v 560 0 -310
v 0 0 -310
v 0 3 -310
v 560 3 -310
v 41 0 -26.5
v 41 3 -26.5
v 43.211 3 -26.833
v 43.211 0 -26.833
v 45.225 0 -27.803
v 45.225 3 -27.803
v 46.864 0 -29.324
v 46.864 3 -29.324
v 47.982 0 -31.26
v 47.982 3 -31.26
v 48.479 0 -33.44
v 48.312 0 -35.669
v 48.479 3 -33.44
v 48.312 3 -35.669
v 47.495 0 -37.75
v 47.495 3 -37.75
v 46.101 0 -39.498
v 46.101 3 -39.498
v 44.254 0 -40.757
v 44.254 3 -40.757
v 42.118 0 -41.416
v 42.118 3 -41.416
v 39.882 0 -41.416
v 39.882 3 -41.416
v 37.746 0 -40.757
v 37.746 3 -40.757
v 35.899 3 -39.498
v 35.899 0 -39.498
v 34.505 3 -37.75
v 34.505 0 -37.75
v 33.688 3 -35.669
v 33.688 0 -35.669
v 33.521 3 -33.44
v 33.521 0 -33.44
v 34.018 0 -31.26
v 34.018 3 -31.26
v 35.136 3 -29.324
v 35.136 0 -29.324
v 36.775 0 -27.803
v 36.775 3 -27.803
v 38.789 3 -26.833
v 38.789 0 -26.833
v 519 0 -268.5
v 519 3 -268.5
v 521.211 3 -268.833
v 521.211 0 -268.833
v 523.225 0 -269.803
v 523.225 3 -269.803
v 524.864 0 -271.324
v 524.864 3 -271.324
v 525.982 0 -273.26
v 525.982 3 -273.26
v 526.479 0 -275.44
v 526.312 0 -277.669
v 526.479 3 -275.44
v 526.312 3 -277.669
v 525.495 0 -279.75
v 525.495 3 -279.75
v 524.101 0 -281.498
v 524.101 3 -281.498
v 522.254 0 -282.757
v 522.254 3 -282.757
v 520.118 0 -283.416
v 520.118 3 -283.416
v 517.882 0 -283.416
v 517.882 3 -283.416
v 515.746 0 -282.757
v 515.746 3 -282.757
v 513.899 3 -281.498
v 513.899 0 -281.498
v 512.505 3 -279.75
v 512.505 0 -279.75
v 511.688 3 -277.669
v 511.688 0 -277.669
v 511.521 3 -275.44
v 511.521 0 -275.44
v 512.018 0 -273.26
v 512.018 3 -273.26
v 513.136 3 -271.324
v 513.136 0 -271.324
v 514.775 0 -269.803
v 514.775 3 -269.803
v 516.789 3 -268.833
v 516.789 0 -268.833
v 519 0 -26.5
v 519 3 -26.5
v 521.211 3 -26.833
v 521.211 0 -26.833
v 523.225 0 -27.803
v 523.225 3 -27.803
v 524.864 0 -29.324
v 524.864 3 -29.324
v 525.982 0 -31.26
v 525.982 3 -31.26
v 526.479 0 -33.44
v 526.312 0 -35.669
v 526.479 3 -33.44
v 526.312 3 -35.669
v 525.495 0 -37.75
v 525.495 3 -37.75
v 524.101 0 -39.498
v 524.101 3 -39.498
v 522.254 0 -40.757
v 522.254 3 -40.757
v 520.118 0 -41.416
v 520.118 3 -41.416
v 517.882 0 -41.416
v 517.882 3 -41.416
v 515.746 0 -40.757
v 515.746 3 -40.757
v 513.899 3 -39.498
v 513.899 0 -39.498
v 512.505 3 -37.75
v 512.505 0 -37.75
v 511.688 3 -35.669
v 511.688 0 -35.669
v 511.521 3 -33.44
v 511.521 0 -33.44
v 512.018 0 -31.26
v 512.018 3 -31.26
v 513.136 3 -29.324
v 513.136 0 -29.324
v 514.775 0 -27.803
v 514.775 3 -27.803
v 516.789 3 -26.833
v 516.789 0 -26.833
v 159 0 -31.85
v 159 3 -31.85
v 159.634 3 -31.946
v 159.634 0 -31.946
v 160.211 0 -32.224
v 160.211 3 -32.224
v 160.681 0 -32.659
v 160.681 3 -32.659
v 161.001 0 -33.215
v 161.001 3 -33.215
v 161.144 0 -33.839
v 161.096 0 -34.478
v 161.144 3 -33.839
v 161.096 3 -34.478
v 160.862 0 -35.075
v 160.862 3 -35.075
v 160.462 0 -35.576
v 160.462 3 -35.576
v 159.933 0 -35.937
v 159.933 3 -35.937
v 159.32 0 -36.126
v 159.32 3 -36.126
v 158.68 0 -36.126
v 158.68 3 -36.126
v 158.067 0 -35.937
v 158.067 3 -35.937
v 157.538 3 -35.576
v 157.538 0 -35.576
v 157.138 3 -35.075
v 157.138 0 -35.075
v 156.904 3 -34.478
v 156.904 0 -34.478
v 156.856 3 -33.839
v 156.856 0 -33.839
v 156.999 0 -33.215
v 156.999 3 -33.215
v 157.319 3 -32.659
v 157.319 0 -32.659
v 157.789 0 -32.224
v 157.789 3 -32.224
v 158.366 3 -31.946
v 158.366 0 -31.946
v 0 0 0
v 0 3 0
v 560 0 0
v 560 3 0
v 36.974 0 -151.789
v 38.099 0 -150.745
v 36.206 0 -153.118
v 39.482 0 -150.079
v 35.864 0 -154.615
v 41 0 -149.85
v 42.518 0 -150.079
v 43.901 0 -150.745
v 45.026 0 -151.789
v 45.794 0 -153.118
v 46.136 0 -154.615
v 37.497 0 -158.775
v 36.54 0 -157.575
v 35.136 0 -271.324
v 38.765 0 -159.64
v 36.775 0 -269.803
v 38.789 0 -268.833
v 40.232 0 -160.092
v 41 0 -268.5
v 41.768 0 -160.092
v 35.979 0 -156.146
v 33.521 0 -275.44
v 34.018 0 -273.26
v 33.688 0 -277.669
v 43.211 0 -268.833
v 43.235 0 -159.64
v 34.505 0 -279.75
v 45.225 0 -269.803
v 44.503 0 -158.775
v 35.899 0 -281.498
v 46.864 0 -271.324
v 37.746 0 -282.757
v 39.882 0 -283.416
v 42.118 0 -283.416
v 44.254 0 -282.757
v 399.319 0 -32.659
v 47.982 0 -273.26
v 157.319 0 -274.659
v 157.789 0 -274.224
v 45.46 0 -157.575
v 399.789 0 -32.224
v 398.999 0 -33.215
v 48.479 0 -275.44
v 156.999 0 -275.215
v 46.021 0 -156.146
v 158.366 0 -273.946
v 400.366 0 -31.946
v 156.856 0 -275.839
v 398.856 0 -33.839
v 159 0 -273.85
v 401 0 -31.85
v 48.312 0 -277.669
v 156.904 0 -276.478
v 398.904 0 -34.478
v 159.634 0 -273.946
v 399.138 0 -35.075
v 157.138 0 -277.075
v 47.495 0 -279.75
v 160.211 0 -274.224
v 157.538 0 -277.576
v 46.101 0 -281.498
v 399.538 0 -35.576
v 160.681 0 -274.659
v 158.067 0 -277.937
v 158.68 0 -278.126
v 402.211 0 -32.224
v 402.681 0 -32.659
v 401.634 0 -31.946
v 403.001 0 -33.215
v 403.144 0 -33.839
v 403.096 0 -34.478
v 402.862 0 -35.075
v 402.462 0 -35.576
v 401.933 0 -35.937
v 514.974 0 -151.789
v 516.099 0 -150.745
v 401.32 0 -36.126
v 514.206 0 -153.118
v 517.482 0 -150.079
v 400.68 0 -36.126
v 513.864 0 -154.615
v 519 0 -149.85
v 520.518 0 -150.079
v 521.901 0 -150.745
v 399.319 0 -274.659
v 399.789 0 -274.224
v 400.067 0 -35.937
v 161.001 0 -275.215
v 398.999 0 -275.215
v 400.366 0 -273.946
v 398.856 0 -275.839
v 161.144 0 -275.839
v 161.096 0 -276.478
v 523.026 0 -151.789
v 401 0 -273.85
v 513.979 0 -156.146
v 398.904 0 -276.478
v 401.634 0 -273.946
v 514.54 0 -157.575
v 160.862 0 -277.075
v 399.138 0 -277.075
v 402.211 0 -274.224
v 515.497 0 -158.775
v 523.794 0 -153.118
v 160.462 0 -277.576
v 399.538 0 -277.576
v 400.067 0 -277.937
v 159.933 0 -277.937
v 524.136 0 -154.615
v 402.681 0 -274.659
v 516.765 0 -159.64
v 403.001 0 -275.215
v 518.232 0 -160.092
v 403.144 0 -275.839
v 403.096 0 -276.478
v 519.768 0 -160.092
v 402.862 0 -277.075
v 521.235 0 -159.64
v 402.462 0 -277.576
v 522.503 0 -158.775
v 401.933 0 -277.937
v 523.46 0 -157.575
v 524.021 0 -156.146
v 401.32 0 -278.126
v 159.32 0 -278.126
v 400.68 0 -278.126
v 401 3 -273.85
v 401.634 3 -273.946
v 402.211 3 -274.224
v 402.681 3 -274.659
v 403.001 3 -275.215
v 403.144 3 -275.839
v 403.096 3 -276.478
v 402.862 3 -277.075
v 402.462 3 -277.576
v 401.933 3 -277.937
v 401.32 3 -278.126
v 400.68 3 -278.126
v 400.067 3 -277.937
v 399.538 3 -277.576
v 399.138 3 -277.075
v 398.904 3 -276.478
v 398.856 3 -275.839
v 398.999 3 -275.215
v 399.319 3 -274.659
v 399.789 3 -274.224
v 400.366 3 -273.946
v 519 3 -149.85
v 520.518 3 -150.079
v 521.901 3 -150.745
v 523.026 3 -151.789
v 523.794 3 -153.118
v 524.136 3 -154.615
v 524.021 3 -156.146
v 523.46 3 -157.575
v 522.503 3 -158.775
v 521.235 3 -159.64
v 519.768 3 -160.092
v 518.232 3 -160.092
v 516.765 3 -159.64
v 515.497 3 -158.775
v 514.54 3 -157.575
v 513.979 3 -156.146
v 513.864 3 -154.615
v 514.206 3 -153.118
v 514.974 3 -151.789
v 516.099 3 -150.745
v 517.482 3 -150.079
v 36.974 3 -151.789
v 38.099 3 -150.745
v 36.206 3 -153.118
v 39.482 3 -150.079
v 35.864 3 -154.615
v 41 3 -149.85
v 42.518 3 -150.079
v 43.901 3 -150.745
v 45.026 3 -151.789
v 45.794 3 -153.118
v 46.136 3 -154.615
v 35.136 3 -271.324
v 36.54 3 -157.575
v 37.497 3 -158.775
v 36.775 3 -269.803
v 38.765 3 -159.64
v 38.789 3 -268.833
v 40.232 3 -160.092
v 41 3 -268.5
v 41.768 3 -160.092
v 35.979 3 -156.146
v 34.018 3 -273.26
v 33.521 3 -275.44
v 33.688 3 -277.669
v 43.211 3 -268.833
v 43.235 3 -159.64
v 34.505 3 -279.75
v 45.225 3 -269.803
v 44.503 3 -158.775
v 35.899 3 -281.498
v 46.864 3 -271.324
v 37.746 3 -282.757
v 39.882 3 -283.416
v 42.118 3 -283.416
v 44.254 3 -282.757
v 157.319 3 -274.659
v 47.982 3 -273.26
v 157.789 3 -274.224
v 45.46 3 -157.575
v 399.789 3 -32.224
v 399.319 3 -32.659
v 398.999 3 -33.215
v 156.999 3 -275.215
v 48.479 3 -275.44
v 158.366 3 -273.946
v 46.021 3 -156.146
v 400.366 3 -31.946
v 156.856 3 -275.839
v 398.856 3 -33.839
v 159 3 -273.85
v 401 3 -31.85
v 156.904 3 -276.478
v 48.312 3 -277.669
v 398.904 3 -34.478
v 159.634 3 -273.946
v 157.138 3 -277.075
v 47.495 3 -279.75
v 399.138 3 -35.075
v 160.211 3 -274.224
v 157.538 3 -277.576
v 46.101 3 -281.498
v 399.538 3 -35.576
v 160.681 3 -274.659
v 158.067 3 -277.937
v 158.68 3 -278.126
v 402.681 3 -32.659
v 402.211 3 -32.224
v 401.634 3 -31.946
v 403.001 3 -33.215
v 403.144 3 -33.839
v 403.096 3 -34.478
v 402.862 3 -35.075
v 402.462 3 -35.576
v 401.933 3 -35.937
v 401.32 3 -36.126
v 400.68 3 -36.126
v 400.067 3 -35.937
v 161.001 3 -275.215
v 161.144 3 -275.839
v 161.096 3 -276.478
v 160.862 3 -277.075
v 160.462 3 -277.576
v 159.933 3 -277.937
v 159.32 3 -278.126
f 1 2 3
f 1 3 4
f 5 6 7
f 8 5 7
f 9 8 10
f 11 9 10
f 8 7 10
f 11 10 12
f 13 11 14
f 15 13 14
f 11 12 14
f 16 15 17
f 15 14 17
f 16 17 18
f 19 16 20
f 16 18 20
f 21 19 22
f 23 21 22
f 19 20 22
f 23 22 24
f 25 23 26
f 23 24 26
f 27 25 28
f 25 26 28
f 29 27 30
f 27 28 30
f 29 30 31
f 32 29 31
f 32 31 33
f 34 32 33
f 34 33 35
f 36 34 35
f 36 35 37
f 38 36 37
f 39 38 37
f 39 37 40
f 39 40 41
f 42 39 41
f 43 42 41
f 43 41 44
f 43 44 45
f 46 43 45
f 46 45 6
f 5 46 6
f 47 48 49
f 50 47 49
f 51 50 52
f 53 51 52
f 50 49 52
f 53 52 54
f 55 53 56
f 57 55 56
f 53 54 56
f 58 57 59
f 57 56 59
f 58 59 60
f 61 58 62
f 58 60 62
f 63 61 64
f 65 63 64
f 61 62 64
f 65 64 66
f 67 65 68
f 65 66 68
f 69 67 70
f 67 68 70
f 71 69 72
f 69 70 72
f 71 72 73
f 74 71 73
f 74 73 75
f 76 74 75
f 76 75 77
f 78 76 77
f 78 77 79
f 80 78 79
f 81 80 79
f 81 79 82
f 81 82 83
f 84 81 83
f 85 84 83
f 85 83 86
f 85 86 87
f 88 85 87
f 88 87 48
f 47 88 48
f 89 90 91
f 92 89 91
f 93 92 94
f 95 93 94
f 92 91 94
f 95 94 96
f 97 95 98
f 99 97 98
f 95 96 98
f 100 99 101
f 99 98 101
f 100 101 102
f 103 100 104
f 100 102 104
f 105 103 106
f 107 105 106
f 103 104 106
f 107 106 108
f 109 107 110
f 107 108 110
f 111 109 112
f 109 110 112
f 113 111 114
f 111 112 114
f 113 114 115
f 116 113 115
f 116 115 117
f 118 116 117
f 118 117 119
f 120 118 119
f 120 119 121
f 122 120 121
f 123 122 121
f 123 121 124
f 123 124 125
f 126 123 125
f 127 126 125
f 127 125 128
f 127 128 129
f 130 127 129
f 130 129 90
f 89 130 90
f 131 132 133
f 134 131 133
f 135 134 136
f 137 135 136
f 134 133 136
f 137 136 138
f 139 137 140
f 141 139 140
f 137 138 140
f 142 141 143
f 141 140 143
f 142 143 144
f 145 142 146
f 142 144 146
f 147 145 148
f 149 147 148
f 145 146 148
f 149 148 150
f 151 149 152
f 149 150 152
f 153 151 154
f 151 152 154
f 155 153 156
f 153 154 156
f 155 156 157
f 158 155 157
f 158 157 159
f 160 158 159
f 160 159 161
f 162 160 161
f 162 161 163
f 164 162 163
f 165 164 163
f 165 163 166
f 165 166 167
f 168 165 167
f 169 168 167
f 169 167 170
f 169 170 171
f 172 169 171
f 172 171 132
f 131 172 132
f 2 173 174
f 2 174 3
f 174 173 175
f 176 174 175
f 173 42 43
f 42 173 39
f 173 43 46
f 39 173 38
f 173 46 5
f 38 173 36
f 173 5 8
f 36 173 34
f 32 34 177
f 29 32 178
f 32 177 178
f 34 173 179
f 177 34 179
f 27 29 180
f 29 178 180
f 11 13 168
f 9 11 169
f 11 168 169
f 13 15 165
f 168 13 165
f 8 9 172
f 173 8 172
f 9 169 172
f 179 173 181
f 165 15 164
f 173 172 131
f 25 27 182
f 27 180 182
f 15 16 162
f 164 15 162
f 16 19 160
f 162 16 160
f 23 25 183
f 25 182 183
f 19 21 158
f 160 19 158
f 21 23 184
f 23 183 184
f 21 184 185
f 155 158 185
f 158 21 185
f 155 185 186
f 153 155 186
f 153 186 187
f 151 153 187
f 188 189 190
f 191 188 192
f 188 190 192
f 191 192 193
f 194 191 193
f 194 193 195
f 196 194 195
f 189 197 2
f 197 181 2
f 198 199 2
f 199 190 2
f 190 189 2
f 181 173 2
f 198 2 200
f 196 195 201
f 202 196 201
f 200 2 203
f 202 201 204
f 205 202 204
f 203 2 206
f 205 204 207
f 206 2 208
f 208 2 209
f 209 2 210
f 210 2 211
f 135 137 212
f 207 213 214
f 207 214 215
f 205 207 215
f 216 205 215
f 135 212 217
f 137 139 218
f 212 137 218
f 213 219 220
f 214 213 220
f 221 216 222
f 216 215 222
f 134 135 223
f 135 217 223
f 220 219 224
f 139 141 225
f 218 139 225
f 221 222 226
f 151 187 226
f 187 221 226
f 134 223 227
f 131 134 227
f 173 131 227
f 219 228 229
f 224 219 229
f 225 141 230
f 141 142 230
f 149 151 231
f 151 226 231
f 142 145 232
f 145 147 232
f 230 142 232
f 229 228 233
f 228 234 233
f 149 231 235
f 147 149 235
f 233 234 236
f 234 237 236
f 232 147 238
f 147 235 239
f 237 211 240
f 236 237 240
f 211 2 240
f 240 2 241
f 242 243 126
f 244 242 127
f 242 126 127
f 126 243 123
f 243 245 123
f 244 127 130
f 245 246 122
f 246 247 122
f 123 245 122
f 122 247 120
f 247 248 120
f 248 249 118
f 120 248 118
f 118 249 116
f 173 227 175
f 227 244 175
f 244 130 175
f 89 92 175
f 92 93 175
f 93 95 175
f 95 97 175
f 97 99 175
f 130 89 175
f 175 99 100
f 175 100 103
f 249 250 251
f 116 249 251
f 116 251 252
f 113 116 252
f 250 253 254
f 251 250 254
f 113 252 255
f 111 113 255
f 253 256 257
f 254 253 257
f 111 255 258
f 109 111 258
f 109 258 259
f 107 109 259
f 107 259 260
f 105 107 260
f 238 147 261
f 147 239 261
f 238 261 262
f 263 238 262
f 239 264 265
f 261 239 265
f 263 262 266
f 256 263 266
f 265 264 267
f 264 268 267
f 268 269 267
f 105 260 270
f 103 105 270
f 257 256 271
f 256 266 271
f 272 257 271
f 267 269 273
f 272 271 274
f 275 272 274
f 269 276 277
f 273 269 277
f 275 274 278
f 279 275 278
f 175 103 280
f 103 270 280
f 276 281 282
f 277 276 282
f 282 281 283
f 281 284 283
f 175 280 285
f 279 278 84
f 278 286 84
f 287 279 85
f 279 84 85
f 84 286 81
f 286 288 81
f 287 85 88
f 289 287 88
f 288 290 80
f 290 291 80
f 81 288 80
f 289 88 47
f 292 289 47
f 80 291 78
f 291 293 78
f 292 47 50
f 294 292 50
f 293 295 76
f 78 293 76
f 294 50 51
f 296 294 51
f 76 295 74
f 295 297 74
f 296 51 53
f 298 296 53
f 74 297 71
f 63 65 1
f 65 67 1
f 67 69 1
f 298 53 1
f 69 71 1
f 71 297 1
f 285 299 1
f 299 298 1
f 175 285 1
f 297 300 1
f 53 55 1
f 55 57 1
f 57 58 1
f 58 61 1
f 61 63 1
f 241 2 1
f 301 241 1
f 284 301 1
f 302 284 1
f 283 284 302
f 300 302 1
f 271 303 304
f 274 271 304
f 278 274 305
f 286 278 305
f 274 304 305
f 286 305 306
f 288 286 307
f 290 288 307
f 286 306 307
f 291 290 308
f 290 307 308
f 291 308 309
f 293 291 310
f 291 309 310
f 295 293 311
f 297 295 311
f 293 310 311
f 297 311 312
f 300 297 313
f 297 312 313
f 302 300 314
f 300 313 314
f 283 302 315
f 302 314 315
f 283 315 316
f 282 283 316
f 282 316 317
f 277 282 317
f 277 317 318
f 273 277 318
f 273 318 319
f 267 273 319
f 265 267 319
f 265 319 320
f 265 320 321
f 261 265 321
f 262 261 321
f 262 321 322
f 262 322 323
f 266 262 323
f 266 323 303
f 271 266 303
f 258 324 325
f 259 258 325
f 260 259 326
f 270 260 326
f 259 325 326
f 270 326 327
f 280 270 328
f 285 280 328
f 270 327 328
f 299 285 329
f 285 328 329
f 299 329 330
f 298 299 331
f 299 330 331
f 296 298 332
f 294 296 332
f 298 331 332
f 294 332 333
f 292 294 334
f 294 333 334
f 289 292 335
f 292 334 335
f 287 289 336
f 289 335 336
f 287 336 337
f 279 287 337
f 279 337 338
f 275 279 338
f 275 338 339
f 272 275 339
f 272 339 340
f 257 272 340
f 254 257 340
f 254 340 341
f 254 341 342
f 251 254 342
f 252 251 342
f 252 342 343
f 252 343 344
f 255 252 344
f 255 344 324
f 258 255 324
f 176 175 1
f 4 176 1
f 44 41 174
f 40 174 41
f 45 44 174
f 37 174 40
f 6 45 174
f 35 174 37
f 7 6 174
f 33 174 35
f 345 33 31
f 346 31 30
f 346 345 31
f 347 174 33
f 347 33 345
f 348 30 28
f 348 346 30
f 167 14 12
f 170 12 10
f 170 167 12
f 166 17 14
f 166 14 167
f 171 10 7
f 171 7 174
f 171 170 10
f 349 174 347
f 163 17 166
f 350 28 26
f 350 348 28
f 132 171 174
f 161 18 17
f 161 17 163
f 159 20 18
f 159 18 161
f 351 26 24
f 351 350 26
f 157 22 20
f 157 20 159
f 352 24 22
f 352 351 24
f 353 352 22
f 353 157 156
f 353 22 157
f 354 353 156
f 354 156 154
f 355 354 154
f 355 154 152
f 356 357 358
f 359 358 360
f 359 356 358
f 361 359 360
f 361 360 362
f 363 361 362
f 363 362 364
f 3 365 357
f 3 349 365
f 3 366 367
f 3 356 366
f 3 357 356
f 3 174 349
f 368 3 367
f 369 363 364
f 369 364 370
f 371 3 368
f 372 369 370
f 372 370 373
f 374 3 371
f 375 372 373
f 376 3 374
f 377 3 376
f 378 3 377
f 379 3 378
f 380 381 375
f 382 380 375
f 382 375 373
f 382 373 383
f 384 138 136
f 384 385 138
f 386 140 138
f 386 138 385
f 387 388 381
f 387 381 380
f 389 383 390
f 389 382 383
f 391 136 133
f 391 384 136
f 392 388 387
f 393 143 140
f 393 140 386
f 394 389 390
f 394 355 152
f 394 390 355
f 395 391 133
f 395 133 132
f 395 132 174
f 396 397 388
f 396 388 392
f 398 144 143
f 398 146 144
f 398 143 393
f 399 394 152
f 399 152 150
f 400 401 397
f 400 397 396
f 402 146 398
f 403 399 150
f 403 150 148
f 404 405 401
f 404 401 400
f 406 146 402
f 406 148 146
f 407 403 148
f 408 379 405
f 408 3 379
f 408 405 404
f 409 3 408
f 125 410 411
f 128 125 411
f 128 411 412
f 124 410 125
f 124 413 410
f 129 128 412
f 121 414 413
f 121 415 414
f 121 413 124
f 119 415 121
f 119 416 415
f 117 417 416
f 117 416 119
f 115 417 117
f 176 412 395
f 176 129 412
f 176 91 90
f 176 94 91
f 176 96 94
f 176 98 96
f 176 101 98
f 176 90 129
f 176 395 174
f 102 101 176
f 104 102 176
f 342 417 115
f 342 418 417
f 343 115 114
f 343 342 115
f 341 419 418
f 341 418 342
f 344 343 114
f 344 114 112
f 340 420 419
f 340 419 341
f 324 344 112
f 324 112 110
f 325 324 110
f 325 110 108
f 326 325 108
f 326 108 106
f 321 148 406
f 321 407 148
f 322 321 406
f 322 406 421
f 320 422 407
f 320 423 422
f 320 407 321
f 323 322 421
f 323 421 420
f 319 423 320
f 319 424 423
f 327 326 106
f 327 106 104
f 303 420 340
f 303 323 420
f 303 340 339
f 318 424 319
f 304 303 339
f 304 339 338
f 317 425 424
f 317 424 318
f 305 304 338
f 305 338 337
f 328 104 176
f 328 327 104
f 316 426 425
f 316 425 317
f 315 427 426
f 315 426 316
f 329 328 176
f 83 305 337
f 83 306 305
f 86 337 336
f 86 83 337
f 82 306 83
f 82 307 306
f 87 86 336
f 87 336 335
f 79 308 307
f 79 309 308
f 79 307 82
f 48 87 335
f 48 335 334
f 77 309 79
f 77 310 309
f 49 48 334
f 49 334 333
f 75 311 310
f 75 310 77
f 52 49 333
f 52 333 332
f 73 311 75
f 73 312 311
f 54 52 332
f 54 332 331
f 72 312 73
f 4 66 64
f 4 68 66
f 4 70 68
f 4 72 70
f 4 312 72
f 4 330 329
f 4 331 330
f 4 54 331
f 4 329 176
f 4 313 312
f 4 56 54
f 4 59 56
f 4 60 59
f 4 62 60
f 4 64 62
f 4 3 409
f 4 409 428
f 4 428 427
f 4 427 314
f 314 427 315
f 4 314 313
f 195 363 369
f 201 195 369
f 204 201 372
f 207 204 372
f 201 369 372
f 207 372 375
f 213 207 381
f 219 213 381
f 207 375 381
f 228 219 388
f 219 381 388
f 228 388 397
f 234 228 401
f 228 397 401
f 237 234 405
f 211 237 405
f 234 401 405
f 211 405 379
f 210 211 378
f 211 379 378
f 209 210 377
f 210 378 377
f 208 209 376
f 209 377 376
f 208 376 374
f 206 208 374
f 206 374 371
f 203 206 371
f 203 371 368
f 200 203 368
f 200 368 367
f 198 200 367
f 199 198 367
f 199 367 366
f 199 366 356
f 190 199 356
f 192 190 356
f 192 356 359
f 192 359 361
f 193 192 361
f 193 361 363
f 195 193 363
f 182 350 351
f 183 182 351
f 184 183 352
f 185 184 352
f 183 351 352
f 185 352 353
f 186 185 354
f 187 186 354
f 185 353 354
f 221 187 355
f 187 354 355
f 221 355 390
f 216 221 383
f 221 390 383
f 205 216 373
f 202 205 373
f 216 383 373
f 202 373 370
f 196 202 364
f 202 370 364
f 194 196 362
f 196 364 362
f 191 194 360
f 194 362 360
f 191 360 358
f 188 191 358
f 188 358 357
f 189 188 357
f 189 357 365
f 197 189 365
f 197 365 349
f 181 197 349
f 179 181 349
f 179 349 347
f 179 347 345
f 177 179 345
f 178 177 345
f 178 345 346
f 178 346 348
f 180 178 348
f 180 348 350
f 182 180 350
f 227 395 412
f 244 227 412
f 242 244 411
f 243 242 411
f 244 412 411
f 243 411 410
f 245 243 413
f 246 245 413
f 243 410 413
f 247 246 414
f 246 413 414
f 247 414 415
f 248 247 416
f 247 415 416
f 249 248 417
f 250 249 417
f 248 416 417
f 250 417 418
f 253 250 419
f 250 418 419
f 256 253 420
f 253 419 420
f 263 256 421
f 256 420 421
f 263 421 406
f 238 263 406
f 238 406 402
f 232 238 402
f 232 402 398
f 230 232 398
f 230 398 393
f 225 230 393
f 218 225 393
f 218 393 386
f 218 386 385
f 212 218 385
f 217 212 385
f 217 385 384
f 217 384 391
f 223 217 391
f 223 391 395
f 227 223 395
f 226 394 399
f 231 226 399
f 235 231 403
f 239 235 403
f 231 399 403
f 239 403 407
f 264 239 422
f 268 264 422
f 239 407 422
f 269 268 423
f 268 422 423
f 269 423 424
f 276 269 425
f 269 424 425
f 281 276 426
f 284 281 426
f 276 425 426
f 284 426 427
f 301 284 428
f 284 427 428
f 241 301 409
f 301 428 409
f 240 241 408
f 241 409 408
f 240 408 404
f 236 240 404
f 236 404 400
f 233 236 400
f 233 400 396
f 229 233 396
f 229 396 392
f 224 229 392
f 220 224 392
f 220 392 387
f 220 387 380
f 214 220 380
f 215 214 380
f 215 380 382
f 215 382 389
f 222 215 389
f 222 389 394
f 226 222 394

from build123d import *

# Parameters (mm, degrees)
SKETCH2_W           = 560
SKETCH2_H           = 310
BOSS_EXTRUDE1_DEPTH = 3
SKETCH3_R           = 2.15
CUT_EXTRUDE1_DEPTH  = 641.085150585
SKETCH4_R           = 5.15
CUT_EXTRUDE2_DEPTH  = 641.085150585
SKETCH5_R           = 7.5
CUT_EXTRUDE3_DEPTH  = 641.085150585


with BuildPart() as part:
    # Sketch2 → Boss-Extrude1 (new body)
    with BuildSketch(Plane(origin=(0, 0, 0), x_dir=(1, 0, 0), z_dir=(0, 1, 0))):
        with Locations((280, 155)):
            Rectangle(SKETCH2_W, SKETCH2_H)
    extrude(amount=BOSS_EXTRUDE1_DEPTH)

    # Sketch3 → Cut-Extrude1 (cut, through all)
    with BuildSketch(Plane(origin=(0, 3, 0), x_dir=(1, 0, 0), z_dir=(0, 1, 0))):
        with Locations(Location((159, 276, 0), (0, 0, 270))):
            Circle(SKETCH3_R)
        with Locations(Location((401, 276, 0), (0, 0, 270))):
            Circle(SKETCH3_R)
        with Locations(Location((401, 34, 0), (0, 0, 270))):
            Circle(SKETCH3_R)
        with Locations(Location((159, 34, 0), (0, 0, 270))):
            Circle(SKETCH3_R)
    extrude(amount=-CUT_EXTRUDE1_DEPTH, mode=Mode.SUBTRACT)

    # Sketch4 → Cut-Extrude2 (cut, through all)
    with BuildSketch(Plane(origin=(0, 3, 0), x_dir=(1, 0, 0), z_dir=(0, 1, 0))):
        with Locations(Location((41, 155, 0), (0, 0, 270))):
            Circle(SKETCH4_R)
        with Locations(Location((519, 155, 0), (0, 0, 270))):
            Circle(SKETCH4_R)
    extrude(amount=-CUT_EXTRUDE2_DEPTH, mode=Mode.SUBTRACT)

    # Sketch5 → Cut-Extrude3 (cut, through all)
    with BuildSketch(Plane(origin=(0, 3, 0), x_dir=(1, 0, 0), z_dir=(0, 1, 0))):
        with Locations(Location((41, 34, 0), (0, 0, 270))):
            Circle(SKETCH5_R)
        with Locations(Location((41, 276, 0), (0, 0, 270))):
            Circle(SKETCH5_R)
        with Locations(Location((519, 276, 0), (0, 0, 270))):
            Circle(SKETCH5_R)
        with Locations(Location((519, 34, 0), (0, 0, 270))):
            Circle(SKETCH5_R)
    extrude(amount=-CUT_EXTRUDE3_DEPTH, mode=Mode.SUBTRACT)


solid = part.part
